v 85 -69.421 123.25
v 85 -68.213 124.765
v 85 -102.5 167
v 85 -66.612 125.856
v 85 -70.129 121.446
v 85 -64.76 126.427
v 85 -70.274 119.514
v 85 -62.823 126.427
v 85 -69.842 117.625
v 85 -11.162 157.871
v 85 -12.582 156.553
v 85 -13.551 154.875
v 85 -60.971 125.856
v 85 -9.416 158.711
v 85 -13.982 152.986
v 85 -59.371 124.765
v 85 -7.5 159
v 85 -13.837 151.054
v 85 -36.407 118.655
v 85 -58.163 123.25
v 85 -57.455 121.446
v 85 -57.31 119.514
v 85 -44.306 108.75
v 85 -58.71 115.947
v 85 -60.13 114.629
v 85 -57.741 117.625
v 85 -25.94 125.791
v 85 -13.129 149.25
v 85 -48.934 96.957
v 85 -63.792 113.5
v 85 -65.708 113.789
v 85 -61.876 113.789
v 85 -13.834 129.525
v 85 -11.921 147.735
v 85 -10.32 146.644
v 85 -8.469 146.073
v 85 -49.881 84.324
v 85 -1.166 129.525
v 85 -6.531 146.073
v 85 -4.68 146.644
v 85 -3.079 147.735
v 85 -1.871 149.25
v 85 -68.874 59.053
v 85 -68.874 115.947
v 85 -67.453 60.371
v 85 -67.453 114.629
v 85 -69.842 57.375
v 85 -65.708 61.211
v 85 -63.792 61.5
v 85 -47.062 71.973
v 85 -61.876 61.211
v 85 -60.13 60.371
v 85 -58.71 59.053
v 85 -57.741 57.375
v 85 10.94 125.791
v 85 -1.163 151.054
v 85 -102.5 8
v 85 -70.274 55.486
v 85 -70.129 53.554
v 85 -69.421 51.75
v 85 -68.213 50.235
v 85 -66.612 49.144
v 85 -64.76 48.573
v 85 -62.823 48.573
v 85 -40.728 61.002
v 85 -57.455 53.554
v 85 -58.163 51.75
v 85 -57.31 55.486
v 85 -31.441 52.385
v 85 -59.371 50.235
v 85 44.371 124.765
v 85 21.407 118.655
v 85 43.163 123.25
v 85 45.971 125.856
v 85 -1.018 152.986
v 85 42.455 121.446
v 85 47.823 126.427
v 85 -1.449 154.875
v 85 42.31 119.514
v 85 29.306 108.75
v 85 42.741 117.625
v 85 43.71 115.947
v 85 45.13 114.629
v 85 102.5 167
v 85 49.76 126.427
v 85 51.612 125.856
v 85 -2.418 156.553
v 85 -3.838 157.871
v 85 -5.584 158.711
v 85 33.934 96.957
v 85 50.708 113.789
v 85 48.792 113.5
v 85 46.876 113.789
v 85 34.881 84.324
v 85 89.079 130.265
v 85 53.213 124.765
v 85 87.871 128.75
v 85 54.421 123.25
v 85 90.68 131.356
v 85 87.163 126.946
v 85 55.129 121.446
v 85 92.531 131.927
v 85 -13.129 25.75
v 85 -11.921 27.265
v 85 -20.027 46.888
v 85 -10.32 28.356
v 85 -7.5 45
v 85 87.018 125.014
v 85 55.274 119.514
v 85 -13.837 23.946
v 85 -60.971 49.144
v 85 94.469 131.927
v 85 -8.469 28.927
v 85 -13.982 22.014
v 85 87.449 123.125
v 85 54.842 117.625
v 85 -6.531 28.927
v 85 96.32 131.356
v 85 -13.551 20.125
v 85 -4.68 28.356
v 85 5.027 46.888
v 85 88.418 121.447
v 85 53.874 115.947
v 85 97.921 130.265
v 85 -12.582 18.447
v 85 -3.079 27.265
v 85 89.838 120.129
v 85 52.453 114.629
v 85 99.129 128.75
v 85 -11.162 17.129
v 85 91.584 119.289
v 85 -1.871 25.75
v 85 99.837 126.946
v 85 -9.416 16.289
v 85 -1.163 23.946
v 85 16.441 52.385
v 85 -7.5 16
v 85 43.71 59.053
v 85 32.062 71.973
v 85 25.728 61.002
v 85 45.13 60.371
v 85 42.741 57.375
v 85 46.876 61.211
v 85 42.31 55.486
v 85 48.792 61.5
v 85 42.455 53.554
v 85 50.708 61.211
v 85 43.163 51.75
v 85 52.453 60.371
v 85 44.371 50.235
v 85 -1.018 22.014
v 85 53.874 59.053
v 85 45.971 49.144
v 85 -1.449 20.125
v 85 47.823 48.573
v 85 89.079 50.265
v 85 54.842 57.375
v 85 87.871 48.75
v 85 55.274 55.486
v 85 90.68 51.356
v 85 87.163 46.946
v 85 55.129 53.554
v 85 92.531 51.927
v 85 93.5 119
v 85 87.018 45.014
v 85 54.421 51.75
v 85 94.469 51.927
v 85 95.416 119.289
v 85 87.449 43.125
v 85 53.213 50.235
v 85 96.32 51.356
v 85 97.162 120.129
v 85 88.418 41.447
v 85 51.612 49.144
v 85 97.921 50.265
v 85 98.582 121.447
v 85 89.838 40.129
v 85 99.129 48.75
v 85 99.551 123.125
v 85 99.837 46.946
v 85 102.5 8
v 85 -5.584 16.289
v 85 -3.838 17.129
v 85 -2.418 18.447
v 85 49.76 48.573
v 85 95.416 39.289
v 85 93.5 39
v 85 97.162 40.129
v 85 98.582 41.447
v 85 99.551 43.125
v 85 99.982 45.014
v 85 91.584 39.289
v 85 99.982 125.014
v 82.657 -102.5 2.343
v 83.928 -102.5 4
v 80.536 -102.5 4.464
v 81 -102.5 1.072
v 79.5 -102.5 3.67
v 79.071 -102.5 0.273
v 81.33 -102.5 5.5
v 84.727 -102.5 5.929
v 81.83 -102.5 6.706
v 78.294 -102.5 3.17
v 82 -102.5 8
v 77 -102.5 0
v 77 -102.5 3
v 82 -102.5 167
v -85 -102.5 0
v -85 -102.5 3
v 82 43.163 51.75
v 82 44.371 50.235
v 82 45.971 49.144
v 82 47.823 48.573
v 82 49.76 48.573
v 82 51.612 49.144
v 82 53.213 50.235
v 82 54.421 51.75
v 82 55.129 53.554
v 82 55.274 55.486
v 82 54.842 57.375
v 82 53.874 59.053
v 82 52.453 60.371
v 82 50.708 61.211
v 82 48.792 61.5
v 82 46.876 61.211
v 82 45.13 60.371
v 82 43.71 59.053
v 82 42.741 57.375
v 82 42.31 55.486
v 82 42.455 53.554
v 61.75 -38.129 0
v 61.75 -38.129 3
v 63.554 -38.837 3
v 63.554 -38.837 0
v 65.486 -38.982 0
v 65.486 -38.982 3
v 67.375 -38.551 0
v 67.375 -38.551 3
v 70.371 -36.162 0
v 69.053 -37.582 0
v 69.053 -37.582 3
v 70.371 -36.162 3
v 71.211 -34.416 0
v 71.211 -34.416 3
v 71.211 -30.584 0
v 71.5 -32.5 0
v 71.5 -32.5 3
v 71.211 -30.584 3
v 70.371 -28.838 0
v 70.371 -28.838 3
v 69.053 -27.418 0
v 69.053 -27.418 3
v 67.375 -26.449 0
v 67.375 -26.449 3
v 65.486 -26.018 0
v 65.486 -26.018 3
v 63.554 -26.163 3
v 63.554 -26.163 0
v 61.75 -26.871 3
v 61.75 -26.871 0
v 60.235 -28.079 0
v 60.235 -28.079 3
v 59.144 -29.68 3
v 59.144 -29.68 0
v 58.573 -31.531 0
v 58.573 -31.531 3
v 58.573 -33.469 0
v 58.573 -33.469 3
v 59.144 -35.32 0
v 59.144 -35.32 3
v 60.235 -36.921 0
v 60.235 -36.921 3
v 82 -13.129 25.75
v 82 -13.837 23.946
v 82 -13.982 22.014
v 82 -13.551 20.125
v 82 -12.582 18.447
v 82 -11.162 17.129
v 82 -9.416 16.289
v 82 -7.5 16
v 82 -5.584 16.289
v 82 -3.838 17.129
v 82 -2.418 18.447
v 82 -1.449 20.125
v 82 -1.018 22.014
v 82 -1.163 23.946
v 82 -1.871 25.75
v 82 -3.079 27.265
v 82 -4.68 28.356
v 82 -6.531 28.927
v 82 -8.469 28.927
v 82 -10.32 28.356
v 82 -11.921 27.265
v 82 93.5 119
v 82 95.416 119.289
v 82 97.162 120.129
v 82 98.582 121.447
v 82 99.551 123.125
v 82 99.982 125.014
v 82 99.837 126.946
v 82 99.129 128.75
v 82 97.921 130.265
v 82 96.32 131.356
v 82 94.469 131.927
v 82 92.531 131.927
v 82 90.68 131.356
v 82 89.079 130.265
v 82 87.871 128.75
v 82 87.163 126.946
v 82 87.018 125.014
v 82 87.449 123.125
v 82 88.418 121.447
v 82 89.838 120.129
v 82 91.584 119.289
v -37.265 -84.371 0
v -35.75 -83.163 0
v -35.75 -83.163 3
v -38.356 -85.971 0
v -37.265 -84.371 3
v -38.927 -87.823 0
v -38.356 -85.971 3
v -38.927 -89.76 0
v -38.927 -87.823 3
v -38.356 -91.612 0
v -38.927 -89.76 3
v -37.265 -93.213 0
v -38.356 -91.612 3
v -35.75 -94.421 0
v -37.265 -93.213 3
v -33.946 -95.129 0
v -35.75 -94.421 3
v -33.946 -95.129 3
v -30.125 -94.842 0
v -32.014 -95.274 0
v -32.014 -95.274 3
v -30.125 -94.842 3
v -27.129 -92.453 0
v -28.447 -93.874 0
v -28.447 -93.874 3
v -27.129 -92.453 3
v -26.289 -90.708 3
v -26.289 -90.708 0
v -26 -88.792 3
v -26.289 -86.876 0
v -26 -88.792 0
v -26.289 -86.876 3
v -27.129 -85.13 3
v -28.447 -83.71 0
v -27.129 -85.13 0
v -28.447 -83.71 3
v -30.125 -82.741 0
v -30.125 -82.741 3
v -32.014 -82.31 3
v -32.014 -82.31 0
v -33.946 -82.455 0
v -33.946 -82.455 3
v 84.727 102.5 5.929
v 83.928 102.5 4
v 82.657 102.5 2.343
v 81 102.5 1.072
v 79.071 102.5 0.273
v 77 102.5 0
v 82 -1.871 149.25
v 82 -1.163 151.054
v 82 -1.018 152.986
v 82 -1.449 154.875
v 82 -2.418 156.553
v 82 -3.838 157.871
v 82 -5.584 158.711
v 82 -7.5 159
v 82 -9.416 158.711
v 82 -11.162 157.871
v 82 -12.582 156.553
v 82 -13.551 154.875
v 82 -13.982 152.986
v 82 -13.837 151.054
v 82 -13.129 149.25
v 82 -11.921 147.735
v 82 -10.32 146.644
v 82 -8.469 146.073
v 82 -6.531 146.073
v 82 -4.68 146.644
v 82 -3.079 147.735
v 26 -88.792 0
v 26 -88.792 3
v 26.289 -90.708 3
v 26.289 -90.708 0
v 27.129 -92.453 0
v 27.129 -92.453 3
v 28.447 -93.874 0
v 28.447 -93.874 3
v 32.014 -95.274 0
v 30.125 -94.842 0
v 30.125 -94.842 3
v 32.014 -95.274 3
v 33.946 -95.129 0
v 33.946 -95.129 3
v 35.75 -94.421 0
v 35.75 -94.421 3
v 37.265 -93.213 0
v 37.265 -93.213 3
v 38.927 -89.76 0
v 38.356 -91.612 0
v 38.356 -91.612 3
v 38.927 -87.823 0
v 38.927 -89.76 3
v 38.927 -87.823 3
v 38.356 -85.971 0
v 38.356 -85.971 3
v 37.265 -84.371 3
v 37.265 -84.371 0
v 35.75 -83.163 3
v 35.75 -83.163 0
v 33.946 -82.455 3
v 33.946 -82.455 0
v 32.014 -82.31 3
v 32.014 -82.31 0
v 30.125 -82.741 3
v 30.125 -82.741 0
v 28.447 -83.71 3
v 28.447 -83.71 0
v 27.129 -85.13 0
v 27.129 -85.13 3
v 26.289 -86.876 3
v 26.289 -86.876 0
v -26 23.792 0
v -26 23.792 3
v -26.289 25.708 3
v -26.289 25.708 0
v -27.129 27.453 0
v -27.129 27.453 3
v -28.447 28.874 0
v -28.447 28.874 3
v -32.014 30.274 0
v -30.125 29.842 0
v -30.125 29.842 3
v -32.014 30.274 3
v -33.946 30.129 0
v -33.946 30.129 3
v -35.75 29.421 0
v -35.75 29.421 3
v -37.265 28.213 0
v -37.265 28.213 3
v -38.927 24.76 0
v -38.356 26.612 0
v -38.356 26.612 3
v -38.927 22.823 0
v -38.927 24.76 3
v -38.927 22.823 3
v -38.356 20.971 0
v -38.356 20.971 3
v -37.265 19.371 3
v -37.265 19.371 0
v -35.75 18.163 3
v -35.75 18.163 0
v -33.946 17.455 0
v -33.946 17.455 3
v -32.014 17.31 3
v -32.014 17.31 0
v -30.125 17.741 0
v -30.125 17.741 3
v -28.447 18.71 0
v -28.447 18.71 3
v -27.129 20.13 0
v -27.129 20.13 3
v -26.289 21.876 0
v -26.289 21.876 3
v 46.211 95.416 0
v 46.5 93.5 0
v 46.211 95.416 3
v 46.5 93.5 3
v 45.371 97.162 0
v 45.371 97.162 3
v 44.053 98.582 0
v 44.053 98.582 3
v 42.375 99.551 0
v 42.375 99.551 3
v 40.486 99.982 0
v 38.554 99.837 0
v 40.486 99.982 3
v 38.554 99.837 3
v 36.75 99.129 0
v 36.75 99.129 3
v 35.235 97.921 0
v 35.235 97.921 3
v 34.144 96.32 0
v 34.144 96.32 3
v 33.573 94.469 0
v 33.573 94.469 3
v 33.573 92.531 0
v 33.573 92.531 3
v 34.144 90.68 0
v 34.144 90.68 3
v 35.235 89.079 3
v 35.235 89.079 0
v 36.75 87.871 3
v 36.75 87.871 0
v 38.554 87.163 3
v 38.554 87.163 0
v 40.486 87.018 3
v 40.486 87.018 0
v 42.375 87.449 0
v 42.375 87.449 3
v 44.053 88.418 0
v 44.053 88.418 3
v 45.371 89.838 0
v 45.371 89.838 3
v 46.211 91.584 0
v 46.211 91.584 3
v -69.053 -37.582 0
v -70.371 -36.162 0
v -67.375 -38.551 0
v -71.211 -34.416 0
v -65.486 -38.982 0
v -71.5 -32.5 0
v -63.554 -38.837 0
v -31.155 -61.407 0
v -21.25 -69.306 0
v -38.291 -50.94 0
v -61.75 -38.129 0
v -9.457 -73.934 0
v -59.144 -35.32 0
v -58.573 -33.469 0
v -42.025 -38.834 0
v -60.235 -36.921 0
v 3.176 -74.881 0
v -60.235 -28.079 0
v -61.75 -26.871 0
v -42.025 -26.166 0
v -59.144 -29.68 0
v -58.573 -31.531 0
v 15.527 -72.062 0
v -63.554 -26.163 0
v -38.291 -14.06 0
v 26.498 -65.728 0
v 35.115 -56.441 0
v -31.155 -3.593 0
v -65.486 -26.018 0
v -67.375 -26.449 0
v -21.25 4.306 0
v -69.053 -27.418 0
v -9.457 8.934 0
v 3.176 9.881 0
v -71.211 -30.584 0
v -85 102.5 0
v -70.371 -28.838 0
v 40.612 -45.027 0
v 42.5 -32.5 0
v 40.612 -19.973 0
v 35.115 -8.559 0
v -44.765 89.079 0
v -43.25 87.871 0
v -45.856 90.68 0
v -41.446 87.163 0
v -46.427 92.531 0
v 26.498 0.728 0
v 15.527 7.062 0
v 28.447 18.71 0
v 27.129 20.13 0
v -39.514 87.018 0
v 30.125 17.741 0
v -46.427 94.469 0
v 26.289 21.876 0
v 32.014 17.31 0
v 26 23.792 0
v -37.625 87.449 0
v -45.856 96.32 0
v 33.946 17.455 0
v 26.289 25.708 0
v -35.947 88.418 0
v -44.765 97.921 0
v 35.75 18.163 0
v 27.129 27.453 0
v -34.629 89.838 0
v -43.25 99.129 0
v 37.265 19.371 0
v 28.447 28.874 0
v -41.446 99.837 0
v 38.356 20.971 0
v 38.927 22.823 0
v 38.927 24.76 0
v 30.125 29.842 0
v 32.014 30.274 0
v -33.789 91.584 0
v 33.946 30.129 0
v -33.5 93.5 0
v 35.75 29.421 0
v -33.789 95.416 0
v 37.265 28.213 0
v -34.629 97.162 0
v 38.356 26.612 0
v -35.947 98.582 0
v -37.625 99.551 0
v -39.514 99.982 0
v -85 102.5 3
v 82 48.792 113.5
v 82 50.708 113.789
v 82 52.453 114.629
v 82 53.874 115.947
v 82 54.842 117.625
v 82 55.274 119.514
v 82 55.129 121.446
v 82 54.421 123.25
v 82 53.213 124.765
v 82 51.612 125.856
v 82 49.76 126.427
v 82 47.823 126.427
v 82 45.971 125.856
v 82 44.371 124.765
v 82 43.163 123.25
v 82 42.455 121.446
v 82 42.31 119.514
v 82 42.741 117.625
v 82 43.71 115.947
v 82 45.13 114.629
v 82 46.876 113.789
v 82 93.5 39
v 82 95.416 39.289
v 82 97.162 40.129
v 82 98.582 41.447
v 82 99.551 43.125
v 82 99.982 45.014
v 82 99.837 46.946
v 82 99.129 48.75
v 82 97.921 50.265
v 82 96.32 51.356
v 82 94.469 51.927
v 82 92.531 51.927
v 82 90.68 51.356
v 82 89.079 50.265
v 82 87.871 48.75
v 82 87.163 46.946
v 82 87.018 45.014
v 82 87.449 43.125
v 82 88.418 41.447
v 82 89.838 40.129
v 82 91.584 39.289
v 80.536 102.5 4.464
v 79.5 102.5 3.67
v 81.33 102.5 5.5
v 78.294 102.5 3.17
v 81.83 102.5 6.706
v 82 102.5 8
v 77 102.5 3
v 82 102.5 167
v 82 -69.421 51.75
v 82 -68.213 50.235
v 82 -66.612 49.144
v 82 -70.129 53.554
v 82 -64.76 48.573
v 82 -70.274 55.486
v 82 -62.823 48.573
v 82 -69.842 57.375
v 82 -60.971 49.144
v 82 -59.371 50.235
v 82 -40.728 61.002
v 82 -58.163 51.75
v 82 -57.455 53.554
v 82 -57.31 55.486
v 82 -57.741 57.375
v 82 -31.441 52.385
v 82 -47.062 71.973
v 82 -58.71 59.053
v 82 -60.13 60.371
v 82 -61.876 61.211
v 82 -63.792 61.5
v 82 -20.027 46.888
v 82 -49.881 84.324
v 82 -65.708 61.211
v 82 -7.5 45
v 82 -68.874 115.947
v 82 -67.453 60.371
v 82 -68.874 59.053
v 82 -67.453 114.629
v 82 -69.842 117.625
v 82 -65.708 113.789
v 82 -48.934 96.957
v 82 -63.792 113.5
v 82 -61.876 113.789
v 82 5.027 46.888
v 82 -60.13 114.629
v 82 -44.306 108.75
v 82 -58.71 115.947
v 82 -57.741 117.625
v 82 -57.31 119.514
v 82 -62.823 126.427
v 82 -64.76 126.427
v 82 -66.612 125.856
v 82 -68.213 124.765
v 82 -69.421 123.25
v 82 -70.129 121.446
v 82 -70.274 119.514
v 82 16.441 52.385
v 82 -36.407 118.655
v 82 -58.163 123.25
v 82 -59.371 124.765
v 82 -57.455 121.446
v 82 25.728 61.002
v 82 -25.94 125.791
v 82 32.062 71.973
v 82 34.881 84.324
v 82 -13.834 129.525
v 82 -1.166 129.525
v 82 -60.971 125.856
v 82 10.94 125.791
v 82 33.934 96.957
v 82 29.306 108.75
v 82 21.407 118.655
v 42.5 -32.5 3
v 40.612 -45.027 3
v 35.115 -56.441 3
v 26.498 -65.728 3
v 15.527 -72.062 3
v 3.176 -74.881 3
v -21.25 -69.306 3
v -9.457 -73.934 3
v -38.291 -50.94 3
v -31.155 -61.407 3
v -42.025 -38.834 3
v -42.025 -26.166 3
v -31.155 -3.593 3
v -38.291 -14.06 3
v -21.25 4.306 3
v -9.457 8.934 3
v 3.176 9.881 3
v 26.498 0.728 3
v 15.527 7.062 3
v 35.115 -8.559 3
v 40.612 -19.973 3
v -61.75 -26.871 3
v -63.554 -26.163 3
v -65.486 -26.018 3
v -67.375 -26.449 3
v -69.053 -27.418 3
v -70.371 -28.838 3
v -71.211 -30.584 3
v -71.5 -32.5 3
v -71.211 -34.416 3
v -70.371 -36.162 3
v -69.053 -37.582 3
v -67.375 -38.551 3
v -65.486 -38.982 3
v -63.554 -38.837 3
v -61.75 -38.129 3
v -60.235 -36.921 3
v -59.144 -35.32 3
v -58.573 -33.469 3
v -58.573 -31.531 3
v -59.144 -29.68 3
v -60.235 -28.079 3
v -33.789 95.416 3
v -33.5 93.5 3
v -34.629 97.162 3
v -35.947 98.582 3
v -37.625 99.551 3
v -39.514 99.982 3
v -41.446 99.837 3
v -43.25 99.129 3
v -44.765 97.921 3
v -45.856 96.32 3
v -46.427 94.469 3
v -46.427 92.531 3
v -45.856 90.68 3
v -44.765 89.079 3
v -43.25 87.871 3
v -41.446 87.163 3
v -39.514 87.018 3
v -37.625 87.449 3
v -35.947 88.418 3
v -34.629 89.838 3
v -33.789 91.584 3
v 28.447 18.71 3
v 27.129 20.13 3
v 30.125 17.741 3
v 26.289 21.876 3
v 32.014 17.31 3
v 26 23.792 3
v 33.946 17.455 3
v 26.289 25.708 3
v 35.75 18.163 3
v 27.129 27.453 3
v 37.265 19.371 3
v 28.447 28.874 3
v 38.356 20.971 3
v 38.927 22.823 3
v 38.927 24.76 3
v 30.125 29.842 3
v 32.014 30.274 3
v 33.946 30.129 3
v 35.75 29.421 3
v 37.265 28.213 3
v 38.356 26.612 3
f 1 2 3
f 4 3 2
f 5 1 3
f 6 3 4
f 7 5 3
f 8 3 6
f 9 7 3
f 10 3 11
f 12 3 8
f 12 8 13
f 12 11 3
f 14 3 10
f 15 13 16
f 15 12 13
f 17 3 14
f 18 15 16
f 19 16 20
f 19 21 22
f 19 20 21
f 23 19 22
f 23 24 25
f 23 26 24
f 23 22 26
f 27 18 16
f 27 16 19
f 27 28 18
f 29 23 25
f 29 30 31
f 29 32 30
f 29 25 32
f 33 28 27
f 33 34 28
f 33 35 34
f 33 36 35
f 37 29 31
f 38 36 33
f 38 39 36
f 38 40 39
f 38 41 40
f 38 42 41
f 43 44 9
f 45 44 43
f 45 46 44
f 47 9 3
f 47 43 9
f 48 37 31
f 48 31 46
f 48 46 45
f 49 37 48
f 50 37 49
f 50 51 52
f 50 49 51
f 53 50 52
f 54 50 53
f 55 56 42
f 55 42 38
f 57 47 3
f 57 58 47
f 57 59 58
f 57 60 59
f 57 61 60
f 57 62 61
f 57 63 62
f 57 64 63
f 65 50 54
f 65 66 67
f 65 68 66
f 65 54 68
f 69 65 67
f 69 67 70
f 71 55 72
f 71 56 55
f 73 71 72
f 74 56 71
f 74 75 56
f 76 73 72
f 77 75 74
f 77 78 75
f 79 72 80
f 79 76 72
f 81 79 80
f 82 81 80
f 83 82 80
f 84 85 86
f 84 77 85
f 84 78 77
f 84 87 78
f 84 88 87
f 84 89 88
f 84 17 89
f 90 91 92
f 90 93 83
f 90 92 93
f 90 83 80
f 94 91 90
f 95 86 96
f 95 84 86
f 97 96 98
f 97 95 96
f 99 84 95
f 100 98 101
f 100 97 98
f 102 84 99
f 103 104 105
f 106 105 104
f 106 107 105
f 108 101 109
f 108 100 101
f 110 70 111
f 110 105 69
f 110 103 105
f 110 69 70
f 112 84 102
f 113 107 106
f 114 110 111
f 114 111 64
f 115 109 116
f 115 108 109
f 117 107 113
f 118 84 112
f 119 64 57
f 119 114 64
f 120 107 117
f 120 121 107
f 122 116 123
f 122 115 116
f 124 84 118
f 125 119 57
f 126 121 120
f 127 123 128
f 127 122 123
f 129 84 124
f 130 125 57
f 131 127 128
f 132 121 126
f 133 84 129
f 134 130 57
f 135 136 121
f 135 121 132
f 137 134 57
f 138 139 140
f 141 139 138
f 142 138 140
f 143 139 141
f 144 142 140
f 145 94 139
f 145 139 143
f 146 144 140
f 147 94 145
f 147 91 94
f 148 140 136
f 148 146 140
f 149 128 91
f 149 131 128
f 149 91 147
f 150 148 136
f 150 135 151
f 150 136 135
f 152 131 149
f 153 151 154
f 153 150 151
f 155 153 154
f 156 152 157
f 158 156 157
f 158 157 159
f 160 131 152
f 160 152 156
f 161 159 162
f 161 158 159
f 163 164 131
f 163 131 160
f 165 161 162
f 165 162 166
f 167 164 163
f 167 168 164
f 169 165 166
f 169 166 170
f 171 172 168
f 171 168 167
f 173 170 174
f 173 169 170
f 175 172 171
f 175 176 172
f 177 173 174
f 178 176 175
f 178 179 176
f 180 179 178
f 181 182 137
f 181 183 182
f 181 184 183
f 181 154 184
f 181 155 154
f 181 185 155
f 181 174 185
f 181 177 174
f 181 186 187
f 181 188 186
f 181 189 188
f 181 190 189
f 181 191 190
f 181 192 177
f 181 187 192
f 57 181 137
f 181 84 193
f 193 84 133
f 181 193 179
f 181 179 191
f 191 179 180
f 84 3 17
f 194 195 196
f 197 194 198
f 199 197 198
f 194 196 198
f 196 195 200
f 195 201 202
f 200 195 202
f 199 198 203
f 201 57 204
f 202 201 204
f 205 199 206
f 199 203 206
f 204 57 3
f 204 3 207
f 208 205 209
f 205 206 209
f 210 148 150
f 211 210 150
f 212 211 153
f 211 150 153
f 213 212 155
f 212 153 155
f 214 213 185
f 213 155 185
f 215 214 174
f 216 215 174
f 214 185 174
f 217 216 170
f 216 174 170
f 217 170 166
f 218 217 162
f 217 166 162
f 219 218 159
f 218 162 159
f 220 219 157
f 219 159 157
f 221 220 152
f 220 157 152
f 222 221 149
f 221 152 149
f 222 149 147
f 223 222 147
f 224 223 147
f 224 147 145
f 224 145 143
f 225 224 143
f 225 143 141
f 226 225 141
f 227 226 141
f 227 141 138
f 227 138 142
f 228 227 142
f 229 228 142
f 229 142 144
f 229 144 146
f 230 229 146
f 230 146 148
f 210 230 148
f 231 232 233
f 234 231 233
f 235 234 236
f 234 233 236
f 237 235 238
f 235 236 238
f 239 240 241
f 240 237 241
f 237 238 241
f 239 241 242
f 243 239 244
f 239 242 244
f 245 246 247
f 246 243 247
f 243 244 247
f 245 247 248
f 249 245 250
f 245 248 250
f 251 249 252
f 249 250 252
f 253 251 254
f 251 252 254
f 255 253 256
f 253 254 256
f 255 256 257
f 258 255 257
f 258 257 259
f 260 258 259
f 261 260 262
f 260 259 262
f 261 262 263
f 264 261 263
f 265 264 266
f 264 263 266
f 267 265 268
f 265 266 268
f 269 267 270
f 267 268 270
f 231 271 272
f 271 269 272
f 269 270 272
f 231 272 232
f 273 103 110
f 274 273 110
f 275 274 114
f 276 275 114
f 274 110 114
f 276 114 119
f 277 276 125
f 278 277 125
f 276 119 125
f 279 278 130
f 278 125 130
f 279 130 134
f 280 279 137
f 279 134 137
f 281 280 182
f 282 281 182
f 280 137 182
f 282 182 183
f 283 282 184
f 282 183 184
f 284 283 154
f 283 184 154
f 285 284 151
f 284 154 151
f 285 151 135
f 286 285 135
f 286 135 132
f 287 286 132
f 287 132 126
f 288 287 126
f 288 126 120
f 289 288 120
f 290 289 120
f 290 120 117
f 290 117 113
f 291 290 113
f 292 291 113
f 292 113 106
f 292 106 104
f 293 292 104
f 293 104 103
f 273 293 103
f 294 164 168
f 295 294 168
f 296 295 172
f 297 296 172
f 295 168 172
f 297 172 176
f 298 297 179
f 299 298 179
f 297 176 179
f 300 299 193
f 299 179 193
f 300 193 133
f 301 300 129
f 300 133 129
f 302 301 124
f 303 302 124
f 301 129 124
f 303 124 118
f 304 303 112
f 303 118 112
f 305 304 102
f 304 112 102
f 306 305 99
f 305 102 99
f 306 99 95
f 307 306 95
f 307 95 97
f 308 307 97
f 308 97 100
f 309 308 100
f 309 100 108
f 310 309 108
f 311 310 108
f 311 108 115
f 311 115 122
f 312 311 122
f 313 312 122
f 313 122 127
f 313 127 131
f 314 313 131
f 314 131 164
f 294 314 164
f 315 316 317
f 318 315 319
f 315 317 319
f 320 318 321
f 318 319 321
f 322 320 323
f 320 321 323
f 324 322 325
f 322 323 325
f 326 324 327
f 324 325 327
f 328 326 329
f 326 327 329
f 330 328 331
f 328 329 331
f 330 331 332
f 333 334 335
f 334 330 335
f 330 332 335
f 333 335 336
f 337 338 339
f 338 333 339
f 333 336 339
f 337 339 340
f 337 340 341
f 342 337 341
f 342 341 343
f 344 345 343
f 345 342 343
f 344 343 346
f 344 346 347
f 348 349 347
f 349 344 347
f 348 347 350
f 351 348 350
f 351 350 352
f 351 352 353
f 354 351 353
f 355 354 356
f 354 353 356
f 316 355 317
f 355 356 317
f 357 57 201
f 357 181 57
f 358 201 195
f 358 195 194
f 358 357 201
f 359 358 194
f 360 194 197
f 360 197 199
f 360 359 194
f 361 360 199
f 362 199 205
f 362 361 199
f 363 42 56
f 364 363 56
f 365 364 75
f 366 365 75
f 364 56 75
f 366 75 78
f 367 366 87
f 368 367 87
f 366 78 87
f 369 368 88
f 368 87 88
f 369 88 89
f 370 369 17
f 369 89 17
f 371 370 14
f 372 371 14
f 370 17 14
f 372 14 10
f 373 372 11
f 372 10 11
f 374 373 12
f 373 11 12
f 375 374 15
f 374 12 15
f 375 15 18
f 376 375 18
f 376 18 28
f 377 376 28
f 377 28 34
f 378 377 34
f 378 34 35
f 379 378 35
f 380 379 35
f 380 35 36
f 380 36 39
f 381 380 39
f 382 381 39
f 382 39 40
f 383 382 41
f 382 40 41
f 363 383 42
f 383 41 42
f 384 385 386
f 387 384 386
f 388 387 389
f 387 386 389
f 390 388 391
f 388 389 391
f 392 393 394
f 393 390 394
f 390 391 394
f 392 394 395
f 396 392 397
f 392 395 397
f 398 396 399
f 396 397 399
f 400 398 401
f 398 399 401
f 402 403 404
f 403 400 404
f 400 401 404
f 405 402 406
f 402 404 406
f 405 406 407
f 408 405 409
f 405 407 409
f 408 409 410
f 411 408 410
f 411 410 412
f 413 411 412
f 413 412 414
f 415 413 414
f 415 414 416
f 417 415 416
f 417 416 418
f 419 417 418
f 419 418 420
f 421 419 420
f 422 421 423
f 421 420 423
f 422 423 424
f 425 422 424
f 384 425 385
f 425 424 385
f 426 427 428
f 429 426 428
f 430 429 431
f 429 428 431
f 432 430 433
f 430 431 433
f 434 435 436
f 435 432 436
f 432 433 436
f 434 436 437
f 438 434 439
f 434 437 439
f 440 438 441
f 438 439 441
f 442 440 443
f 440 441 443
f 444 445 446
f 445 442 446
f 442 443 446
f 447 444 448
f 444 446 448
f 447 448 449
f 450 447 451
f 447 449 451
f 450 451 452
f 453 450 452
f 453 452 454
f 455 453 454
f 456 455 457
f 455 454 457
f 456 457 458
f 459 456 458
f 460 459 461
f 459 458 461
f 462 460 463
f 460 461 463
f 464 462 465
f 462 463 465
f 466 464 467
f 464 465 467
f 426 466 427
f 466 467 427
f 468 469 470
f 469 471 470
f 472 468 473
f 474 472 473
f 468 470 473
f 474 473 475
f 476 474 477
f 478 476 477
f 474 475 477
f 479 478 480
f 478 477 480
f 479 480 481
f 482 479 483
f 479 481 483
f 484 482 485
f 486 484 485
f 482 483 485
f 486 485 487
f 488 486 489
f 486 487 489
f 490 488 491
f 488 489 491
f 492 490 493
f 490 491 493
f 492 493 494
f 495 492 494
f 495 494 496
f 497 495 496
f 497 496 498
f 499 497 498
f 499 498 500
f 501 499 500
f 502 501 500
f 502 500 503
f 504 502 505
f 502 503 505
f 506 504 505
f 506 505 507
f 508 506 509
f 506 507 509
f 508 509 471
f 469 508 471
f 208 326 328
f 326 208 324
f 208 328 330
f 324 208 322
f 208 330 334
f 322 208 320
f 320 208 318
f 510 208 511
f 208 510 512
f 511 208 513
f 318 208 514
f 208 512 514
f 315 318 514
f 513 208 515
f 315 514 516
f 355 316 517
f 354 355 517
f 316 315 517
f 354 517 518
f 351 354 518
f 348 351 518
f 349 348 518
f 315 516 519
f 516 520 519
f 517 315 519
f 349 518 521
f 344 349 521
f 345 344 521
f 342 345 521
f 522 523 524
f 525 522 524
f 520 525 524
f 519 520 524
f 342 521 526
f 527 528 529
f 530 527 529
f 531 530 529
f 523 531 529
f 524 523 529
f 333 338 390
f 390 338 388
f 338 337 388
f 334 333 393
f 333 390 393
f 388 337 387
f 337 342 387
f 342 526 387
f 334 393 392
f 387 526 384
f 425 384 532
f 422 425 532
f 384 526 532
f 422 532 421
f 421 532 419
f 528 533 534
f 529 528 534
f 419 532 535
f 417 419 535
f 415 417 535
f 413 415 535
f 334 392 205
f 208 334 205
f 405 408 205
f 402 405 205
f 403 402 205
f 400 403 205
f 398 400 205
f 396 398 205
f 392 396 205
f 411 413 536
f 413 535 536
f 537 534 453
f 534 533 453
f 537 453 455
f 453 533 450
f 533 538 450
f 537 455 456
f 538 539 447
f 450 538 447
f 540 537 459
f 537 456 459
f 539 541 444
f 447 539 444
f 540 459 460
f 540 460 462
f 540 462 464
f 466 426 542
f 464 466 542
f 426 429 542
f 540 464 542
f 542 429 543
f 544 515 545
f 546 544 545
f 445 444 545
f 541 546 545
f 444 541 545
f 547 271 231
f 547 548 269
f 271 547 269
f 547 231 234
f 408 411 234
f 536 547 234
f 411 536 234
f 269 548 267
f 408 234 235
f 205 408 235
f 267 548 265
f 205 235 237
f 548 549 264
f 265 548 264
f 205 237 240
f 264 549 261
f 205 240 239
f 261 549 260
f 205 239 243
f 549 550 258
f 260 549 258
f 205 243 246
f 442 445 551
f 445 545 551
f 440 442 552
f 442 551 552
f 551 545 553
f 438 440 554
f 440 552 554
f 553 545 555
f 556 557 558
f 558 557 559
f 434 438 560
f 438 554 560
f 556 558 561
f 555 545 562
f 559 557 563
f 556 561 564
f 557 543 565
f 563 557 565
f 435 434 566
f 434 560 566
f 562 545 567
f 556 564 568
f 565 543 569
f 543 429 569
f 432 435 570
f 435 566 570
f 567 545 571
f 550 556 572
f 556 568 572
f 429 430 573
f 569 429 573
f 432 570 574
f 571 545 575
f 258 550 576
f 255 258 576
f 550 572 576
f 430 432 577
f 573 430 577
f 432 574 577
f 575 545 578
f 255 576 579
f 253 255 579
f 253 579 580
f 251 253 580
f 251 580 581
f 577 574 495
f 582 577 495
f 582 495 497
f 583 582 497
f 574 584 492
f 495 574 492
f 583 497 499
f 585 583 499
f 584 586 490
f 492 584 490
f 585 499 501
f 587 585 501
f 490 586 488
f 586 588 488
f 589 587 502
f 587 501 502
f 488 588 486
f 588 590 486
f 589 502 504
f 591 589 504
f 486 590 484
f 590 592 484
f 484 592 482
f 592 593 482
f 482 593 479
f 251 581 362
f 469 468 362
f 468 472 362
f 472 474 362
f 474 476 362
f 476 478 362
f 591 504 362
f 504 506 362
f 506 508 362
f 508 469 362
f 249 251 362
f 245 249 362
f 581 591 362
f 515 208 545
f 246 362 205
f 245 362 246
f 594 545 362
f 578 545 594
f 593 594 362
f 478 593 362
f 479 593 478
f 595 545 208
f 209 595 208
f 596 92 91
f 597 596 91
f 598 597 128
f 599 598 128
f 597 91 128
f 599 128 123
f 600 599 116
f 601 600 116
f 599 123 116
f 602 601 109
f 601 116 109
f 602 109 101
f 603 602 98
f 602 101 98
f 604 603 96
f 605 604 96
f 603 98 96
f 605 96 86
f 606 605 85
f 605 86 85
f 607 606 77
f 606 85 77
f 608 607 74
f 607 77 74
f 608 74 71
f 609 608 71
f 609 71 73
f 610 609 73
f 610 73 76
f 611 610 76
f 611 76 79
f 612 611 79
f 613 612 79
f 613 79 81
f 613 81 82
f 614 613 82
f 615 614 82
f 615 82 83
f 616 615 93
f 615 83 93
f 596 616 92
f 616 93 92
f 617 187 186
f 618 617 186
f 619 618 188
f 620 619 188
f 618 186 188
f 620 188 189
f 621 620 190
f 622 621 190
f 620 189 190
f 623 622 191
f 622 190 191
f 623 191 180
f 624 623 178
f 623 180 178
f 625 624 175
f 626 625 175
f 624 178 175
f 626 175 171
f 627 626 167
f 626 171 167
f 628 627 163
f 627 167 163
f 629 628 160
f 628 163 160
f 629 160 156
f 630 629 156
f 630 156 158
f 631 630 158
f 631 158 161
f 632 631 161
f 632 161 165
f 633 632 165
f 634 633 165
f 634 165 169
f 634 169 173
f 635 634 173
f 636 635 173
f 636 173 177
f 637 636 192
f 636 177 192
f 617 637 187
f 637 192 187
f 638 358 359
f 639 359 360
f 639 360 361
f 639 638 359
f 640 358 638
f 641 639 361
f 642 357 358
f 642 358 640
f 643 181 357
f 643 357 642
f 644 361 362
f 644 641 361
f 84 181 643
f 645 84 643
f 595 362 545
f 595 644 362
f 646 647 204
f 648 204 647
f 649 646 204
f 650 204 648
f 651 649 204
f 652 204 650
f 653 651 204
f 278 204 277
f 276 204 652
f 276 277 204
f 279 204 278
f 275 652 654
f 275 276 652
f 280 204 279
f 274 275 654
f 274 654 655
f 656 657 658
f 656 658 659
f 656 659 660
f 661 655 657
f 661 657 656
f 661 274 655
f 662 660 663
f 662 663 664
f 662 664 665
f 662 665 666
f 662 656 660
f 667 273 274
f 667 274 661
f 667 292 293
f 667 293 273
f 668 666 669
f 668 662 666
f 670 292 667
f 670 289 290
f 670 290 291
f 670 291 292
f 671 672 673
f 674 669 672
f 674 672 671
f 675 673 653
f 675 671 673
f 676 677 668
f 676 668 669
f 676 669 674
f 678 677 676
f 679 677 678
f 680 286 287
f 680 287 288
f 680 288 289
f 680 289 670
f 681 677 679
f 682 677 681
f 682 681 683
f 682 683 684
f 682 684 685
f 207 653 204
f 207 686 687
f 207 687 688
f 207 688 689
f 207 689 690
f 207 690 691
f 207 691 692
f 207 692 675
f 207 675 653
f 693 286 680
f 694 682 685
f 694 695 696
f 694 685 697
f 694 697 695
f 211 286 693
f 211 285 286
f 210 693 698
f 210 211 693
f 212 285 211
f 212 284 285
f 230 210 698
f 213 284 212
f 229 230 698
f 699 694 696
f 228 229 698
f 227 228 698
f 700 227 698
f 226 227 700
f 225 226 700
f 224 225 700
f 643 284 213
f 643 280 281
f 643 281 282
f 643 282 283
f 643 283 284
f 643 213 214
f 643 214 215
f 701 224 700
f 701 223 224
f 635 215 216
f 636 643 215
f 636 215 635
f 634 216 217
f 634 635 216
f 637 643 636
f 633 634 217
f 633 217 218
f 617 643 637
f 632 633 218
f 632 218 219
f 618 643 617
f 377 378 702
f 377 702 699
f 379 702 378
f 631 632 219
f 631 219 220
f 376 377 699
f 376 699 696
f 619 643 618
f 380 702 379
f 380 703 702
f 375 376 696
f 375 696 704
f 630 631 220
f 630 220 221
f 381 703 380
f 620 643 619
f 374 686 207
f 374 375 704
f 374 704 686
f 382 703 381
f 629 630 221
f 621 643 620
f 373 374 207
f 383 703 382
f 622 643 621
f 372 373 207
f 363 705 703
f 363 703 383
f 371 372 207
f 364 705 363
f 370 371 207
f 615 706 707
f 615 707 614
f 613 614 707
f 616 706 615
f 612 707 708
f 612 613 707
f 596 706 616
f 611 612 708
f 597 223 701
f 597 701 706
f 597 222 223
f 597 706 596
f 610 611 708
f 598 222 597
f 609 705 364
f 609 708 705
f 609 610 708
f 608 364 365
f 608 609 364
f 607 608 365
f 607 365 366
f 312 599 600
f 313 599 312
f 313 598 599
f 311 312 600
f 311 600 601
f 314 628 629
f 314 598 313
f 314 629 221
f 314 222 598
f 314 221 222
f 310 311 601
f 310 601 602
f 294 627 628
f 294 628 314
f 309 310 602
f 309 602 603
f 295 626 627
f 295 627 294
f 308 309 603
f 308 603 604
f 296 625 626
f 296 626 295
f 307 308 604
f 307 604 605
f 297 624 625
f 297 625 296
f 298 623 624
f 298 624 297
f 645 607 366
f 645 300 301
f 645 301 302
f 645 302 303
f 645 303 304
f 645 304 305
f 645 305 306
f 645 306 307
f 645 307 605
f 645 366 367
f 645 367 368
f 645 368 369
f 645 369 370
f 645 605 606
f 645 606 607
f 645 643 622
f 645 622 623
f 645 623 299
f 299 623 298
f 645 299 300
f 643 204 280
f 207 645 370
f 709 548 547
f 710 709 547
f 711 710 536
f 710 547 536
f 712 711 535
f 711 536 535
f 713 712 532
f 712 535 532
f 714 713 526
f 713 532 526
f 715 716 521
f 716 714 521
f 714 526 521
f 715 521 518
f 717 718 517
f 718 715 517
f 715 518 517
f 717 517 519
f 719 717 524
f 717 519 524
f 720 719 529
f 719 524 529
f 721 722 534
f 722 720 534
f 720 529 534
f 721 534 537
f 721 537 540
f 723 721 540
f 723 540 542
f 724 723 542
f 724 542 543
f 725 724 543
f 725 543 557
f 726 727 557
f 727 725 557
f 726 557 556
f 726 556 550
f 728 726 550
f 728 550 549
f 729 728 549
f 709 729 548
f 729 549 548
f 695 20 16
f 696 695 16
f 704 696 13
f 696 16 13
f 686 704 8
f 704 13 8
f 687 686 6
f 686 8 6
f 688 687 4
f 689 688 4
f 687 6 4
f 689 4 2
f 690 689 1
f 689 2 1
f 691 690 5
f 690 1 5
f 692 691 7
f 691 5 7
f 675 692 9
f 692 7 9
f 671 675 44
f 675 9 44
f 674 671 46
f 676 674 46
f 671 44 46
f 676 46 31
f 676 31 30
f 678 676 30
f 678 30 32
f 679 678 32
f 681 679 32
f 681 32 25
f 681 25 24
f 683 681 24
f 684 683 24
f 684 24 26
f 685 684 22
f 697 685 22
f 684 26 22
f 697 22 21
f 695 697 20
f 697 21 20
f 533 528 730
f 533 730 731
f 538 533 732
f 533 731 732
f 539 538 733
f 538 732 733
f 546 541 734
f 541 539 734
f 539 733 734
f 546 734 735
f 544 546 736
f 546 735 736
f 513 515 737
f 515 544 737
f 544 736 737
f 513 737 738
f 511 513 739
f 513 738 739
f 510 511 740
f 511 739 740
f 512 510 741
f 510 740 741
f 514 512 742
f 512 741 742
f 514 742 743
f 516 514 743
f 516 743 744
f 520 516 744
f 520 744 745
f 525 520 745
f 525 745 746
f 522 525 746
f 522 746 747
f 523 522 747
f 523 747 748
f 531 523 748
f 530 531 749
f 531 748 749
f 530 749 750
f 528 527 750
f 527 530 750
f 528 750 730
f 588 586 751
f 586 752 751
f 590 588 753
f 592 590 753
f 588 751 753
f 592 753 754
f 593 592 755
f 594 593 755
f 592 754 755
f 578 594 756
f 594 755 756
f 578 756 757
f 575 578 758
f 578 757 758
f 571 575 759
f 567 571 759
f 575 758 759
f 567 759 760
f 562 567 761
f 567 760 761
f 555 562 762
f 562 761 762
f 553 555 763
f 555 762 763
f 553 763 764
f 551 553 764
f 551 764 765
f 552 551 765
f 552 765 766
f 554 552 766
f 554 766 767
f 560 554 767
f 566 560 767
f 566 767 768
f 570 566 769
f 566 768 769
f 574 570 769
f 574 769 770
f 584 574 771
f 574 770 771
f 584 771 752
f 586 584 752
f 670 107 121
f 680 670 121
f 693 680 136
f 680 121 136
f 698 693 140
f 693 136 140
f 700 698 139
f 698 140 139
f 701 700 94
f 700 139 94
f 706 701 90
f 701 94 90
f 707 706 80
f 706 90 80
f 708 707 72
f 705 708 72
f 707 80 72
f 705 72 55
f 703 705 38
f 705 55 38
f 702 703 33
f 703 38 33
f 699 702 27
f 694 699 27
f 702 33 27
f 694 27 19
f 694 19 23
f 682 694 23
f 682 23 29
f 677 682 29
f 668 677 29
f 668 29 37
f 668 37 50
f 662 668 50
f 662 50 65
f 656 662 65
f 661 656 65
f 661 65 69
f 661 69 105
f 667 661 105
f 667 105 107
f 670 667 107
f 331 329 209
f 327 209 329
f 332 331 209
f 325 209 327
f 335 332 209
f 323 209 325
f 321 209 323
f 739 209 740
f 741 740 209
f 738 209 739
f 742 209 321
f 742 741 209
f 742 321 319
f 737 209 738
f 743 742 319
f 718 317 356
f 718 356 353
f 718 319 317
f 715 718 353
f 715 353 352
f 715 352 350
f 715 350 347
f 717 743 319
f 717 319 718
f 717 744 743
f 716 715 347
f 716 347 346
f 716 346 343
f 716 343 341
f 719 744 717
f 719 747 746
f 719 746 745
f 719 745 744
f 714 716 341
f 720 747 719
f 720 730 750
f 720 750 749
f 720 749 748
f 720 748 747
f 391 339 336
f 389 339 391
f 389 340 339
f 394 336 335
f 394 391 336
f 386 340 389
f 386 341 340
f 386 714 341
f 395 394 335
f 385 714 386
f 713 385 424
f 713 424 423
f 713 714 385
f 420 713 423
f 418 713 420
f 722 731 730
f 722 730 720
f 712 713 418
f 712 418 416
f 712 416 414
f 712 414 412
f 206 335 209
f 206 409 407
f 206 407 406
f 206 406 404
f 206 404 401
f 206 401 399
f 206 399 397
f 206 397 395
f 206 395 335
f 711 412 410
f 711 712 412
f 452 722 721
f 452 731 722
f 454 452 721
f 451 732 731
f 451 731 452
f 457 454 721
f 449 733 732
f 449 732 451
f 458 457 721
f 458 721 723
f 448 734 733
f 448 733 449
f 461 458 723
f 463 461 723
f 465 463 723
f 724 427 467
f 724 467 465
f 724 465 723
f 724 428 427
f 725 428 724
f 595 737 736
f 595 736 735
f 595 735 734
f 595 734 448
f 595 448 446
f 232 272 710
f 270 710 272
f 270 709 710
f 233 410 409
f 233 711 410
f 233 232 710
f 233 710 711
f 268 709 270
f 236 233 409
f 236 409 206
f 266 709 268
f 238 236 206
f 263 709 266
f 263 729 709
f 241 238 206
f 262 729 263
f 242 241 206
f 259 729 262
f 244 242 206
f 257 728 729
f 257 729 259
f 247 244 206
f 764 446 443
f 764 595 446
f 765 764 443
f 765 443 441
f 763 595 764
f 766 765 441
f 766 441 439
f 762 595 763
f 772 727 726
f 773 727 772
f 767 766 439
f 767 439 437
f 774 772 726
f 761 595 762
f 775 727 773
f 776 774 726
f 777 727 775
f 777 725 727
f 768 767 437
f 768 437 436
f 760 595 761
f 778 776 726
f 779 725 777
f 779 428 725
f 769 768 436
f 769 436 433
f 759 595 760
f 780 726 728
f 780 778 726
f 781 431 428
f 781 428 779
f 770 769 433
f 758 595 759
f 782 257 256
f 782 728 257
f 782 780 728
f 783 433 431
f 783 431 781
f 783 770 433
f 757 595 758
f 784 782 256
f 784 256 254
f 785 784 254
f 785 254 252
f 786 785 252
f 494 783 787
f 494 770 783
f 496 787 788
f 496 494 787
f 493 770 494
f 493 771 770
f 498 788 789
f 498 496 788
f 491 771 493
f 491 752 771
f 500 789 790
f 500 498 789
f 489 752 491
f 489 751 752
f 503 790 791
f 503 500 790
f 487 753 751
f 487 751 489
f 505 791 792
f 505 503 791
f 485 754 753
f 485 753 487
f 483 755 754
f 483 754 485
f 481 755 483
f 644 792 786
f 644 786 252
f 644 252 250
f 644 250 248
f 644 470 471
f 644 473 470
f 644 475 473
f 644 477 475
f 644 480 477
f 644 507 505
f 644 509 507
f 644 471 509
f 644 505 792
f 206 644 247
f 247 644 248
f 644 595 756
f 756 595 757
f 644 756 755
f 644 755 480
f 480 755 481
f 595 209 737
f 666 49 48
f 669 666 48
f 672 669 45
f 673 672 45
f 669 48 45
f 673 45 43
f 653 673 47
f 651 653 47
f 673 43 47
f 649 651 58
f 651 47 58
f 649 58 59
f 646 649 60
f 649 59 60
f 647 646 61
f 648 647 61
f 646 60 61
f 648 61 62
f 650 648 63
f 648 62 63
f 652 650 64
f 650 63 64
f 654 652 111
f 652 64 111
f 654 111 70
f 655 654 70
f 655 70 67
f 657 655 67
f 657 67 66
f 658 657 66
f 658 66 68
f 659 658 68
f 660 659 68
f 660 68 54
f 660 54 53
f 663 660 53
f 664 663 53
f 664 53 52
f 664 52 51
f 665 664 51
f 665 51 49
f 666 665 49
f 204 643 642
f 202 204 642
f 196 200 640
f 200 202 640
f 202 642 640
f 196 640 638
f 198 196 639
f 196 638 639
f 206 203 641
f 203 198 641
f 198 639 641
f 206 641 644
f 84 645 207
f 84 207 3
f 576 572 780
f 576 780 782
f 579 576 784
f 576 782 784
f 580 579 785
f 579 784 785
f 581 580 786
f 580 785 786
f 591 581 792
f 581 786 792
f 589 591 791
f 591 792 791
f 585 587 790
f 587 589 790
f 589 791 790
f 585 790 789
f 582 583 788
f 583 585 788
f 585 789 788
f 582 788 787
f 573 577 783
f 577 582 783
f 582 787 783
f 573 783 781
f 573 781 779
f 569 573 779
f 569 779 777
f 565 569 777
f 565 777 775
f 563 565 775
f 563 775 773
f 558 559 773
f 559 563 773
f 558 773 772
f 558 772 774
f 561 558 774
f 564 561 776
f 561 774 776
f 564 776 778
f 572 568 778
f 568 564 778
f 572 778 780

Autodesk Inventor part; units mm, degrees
ref_plane "YZ Plane" through (0, 0, 0) normal (1, 0, 0) x (0, 1, 0)
ref_plane "XZ Plane" through (0, 0, 0) normal (0, 1, 0) x (-1, 0, 0)
ref_plane "XY Plane" through (0, 0, 0) normal (0, 0, 1) x (1, 0, 0)
sketch "Sketch1" plane through (0, 0, 0) normal (0, 0, 1) x (1, 0, 0)
  line L0 (-85, -102.5) -> (85, -102.5)
  line L1 (85, -102.5) -> (85, 102.5)
  line L2 (85, 102.5) -> (-85, 102.5)
  line L3 (-85, 102.5) -> (-85, -102.5)
  line L4 (-85, -102.5) -> (85, 102.5) construction
  line L5 (85, -102.5) -> (-85, 102.5) construction
  circle A0 centre (0, -32.5) radius 42.5
  point P0 (0, 0)
  point P1 (0, -102.5)
  dimension "d0" = 170
  dimension "d1" = 205
  dimension "d22" = 85
  dimension "d61" = 70
extrude "Plate1" add sketch "Sketch1" along normal blind 3
sketch "Sketch5" plane through (82, 102.5, 0) normal (1, 0, 0) x (0, 1, 0)
  line L0 (-205, 0) -> (0, 0)
  line L1 (0, 0) -> (0, 167)
  line L2 (0, 167) -> (-205, 167)
  line L3 (-205, 167) -> (-205, 0)
edge flange "Flange2" height 167 angle 90 thickness 3 bend radius 5 thickness toward (1, 0, 0) relief round relief width 3 relief depth 1.5 edges at (85, 0, 3) wall of the first edge with corners at (82, -102.5, 0) (82, 102.5, 0) (82, 102.5, 167) (82, -102.5, 167)
bend "Bend2"
corner "Corner2"
sketch "Sketch6" plane through (85, -102.5, 167) normal (1, 0, 0) x (0, 0, -1)
  line L0 (159, 0) -> (159, 205) projected
  line L1 (0, 205) -> (159, 205) projected
  line L2 (0, 0) -> (0, 205) projected
  line L3 (159, 0) -> (0, 0) projected
  circle A0 centre (79.5, 95) radius 42.5
  point P0 (167, 102.5)
  point P1 (79.5, 205)
  dimension "d33" = 85
  dimension "d60" = 95
extrude "Cut1" cut sketch "Sketch6" against normal blind 3 contours A0
sketch "Sketch7" plane through (85, -102.5, 167) normal (1, 0, 0) x (0, 0, -1)
  circle A0 centre (47, 151.2917) radius 6.5
  circle A1 centre (79.5, 95) radius 42.5 projected
  circle A2 centre (79.5, 95) radius 65 construction
  line L0 (79.5, 95) -> (79.5, 137.5)
  line L1 (79.5, 95) -> (47, 151.2917)
  point P0 (167, 102.5)
  dimension "d37" = 130
  dimension "d36" = 13
  dimension "d81" = 30
extrude "Cut2" cut sketch "Sketch7" against normal blind 3 contours A0
pattern_circular "Circular Pattern1" count 6 over 360 about axis through (85, -7.5, 87.5) along (-1, 0, 0) of "Cut2"
sketch "Sketch8" plane through (0, 0, 3) normal (0, 0, 1) x (1, 0, 0)
  circle A0 centre (-32.5, 23.7917) radius 6.5
  circle A1 centre (0, -32.5) radius 65 construction
  circle A2 centre (0, -32.5) radius 42.5 projected
  line L0 (0, 10) -> (0, -32.5)
  line L1 (0, -32.5) -> (-32.5, 23.7917)
  dimension "d44" = 130
  dimension "d43" = 13
  dimension "d82" = 30
extrude "Cut3" cut sketch "Sketch8" against normal blind 3 contours A0
pattern_circular "Circular Pattern2" count 6 over 360 about axis through (0, -32.5, 0) along (0, 0, 1) of "Cut3"
sketch "Sketch10" plane through (85, -102.5, 167) normal (1, 0, 0) x (0, 0, -1)
  circle A0 centre (41.5, 196) radius 6.5
  circle A1 centre (121.5, 196) radius 6.5
  line L0 (159, 205) -> (0, 205) projected
  line L1 (81.5, 200.962) -> (81.5, 182.1235)
  point P0 (167, 102.5)
  dimension "d62" = 13
  dimension "d63" = 9
  dimension "d64" = 80
  dimension "d72" = 81.5
extrude "Cut4" cut sketch "Sketch10" against normal blind 3
sketch "Sketch11" plane through (0, 0, 3) normal (0, 0, 1) x (1, 0, 0)
  circle A0 centre (-40, 93.5) radius 6.5
  circle A1 centre (40, 93.5) radius 6.5
  line L0 (0, 102.5) -> (0, 73.9677)
  line L1 (-85, 102.5) -> (77, 102.5) projected
  point P0 (0, 0)
  dimension "d67" = 13
  dimension "d68" = 80
  dimension "d69" = 9
extrude "Cut5" cut sketch "Sketch11" against normal blind 3
equation "\"d33\" = d22"
equation "\"d34\" = Thickness"
equation "\"d38\" = Thickness"
equation "\"d45\" = Thickness"
equation "\"d65\" = Thickness"
equation "\"d70\" = Thickness"
equation "\"d2\" = Thickness"
equation "\"d23\" = BendReliefWidth"
equation "\"d24\" = BendReliefDepth"
equation "\"d25\" = MinimumRemnant"
equation "\"d26\" = TransitionRadius"
equation "\"d29\" = BendRadius"
equation "\"d30\" = CornerReliefSize"
equation "\"d31\" = GapSize"
equation "\"d32\" = JacobiRadiusSize"
equation "\"BendReliefWidth\" = Thickness"
equation "\"BendReliefDepth\" = 0.5 * Thickness"
equation "\"CornerReliefSize\" = 4 * Thickness"
equation "\"MinimumRemnant\" = 2 * Thickness"
equation "\"TransitionRadius\" = BendRadius"
equation "\"JacobiRadiusSize\" = BendRadius"
equation "\"GapSize\" = Thickness"
equation "\"Thickness\" = 3"
equation "\"BendRadius\" = 5"
properties part number "drain wall with flange" material "Stainless Steel"
